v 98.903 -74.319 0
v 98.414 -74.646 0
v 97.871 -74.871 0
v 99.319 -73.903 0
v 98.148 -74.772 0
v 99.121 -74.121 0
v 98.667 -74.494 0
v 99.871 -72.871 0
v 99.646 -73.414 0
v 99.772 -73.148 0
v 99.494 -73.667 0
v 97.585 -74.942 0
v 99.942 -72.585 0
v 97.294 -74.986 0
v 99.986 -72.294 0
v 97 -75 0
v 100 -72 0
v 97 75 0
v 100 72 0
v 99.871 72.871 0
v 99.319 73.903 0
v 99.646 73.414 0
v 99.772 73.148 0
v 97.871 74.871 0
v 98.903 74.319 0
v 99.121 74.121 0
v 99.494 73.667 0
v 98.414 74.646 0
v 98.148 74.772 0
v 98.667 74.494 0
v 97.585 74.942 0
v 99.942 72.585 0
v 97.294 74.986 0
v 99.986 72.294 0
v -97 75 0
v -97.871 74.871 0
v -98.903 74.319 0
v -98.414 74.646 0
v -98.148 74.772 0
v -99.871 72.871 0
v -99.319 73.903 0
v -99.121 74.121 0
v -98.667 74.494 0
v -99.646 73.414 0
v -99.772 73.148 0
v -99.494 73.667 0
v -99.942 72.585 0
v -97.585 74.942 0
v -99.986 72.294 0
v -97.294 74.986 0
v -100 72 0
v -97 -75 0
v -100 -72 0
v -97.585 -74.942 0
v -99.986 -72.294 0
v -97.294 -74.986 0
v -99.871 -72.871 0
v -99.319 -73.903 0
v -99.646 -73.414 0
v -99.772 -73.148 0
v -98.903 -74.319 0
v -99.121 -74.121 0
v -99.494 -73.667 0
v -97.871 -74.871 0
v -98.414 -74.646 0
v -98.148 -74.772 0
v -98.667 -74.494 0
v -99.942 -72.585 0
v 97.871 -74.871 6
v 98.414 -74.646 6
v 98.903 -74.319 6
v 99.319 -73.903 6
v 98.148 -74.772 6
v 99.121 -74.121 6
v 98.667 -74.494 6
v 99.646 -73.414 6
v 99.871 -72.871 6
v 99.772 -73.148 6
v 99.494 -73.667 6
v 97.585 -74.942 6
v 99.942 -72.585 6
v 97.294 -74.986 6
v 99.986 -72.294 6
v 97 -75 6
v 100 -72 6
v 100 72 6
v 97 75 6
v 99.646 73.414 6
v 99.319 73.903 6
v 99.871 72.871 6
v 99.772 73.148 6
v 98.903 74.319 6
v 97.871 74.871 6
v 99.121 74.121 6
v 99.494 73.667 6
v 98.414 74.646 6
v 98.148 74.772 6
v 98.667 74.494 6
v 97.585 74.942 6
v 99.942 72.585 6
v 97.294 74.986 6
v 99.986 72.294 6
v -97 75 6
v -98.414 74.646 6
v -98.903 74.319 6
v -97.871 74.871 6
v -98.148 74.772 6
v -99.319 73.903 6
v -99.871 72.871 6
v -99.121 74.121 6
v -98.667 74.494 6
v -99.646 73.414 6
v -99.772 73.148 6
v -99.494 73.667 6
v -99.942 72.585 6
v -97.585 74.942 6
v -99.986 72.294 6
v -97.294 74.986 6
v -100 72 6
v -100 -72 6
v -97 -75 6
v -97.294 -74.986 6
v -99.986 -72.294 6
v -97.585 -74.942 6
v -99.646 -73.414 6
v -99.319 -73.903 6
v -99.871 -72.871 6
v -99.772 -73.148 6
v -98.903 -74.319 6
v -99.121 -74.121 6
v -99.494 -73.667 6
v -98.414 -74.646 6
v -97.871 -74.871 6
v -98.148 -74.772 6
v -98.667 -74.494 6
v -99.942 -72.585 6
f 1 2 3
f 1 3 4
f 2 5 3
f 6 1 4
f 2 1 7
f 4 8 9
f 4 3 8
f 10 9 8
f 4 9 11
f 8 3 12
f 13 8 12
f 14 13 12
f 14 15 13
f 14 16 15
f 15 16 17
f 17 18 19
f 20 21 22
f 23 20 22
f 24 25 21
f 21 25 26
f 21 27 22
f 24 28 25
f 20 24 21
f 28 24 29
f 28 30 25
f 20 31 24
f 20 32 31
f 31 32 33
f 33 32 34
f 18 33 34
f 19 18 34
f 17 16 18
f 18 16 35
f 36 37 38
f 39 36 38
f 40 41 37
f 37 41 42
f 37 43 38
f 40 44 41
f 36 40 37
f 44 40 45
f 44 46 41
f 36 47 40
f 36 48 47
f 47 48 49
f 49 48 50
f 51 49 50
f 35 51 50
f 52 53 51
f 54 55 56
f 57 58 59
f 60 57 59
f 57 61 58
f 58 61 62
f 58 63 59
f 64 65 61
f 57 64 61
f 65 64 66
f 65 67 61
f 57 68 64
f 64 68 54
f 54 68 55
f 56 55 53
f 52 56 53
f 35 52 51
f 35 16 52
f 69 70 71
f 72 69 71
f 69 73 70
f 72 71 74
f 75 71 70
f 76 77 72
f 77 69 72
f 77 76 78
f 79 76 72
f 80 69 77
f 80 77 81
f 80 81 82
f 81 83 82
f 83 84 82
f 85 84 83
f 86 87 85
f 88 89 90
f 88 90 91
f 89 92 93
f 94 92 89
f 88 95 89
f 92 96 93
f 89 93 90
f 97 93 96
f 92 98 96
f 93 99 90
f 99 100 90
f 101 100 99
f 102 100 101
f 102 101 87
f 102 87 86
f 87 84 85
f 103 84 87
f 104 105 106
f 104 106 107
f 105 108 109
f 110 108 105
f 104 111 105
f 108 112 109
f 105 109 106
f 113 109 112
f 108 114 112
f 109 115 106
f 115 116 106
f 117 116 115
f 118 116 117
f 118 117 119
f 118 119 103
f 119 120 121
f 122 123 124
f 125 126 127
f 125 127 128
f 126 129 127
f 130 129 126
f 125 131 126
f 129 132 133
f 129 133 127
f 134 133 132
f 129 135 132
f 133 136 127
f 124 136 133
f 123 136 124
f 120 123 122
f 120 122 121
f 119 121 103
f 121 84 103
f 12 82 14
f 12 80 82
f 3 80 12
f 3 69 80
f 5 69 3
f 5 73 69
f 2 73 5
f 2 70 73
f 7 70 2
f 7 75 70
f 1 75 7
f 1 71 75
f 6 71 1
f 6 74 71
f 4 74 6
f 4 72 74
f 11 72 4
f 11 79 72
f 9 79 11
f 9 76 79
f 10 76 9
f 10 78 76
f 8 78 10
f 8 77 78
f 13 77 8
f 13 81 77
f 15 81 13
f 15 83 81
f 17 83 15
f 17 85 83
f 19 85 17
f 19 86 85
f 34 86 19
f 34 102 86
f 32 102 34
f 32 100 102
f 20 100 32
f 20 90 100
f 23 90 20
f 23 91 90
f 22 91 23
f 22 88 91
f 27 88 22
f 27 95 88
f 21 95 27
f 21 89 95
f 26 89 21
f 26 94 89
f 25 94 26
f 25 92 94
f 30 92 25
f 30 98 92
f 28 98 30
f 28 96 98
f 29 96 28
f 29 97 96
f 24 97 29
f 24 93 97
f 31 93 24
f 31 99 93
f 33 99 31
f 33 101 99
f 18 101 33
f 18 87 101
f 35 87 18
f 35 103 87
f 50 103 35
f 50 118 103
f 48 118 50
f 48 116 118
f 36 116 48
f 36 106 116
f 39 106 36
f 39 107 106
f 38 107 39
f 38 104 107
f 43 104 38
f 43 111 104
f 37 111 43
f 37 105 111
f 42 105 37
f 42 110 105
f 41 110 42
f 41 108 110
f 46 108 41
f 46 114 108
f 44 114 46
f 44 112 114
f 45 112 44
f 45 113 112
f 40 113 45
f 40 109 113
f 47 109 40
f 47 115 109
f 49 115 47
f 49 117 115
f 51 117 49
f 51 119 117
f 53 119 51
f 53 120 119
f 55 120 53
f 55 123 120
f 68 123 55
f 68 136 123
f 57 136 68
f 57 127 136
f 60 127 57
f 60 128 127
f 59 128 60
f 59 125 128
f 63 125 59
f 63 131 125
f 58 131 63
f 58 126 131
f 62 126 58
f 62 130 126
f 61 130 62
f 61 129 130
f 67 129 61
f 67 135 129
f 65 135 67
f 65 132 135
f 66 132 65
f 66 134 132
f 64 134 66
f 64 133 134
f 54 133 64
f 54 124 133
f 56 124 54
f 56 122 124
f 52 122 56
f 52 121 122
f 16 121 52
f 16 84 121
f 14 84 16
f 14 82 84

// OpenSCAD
$fn = 64;

length = 200;
width  = 150;
thickness = 6;

corner_radius = 3;

module rounded_plate(l, w, t, r){
    r2 = min(r, min(l, w)/2);
    linear_extrude(height = t)
        offset(r = r2)
            square([l - 2*r2, w - 2*r2], center = true);
}

color([0.75, 0.78, 0.80])
    rounded_plate(length, width, thickness, corner_radius);
